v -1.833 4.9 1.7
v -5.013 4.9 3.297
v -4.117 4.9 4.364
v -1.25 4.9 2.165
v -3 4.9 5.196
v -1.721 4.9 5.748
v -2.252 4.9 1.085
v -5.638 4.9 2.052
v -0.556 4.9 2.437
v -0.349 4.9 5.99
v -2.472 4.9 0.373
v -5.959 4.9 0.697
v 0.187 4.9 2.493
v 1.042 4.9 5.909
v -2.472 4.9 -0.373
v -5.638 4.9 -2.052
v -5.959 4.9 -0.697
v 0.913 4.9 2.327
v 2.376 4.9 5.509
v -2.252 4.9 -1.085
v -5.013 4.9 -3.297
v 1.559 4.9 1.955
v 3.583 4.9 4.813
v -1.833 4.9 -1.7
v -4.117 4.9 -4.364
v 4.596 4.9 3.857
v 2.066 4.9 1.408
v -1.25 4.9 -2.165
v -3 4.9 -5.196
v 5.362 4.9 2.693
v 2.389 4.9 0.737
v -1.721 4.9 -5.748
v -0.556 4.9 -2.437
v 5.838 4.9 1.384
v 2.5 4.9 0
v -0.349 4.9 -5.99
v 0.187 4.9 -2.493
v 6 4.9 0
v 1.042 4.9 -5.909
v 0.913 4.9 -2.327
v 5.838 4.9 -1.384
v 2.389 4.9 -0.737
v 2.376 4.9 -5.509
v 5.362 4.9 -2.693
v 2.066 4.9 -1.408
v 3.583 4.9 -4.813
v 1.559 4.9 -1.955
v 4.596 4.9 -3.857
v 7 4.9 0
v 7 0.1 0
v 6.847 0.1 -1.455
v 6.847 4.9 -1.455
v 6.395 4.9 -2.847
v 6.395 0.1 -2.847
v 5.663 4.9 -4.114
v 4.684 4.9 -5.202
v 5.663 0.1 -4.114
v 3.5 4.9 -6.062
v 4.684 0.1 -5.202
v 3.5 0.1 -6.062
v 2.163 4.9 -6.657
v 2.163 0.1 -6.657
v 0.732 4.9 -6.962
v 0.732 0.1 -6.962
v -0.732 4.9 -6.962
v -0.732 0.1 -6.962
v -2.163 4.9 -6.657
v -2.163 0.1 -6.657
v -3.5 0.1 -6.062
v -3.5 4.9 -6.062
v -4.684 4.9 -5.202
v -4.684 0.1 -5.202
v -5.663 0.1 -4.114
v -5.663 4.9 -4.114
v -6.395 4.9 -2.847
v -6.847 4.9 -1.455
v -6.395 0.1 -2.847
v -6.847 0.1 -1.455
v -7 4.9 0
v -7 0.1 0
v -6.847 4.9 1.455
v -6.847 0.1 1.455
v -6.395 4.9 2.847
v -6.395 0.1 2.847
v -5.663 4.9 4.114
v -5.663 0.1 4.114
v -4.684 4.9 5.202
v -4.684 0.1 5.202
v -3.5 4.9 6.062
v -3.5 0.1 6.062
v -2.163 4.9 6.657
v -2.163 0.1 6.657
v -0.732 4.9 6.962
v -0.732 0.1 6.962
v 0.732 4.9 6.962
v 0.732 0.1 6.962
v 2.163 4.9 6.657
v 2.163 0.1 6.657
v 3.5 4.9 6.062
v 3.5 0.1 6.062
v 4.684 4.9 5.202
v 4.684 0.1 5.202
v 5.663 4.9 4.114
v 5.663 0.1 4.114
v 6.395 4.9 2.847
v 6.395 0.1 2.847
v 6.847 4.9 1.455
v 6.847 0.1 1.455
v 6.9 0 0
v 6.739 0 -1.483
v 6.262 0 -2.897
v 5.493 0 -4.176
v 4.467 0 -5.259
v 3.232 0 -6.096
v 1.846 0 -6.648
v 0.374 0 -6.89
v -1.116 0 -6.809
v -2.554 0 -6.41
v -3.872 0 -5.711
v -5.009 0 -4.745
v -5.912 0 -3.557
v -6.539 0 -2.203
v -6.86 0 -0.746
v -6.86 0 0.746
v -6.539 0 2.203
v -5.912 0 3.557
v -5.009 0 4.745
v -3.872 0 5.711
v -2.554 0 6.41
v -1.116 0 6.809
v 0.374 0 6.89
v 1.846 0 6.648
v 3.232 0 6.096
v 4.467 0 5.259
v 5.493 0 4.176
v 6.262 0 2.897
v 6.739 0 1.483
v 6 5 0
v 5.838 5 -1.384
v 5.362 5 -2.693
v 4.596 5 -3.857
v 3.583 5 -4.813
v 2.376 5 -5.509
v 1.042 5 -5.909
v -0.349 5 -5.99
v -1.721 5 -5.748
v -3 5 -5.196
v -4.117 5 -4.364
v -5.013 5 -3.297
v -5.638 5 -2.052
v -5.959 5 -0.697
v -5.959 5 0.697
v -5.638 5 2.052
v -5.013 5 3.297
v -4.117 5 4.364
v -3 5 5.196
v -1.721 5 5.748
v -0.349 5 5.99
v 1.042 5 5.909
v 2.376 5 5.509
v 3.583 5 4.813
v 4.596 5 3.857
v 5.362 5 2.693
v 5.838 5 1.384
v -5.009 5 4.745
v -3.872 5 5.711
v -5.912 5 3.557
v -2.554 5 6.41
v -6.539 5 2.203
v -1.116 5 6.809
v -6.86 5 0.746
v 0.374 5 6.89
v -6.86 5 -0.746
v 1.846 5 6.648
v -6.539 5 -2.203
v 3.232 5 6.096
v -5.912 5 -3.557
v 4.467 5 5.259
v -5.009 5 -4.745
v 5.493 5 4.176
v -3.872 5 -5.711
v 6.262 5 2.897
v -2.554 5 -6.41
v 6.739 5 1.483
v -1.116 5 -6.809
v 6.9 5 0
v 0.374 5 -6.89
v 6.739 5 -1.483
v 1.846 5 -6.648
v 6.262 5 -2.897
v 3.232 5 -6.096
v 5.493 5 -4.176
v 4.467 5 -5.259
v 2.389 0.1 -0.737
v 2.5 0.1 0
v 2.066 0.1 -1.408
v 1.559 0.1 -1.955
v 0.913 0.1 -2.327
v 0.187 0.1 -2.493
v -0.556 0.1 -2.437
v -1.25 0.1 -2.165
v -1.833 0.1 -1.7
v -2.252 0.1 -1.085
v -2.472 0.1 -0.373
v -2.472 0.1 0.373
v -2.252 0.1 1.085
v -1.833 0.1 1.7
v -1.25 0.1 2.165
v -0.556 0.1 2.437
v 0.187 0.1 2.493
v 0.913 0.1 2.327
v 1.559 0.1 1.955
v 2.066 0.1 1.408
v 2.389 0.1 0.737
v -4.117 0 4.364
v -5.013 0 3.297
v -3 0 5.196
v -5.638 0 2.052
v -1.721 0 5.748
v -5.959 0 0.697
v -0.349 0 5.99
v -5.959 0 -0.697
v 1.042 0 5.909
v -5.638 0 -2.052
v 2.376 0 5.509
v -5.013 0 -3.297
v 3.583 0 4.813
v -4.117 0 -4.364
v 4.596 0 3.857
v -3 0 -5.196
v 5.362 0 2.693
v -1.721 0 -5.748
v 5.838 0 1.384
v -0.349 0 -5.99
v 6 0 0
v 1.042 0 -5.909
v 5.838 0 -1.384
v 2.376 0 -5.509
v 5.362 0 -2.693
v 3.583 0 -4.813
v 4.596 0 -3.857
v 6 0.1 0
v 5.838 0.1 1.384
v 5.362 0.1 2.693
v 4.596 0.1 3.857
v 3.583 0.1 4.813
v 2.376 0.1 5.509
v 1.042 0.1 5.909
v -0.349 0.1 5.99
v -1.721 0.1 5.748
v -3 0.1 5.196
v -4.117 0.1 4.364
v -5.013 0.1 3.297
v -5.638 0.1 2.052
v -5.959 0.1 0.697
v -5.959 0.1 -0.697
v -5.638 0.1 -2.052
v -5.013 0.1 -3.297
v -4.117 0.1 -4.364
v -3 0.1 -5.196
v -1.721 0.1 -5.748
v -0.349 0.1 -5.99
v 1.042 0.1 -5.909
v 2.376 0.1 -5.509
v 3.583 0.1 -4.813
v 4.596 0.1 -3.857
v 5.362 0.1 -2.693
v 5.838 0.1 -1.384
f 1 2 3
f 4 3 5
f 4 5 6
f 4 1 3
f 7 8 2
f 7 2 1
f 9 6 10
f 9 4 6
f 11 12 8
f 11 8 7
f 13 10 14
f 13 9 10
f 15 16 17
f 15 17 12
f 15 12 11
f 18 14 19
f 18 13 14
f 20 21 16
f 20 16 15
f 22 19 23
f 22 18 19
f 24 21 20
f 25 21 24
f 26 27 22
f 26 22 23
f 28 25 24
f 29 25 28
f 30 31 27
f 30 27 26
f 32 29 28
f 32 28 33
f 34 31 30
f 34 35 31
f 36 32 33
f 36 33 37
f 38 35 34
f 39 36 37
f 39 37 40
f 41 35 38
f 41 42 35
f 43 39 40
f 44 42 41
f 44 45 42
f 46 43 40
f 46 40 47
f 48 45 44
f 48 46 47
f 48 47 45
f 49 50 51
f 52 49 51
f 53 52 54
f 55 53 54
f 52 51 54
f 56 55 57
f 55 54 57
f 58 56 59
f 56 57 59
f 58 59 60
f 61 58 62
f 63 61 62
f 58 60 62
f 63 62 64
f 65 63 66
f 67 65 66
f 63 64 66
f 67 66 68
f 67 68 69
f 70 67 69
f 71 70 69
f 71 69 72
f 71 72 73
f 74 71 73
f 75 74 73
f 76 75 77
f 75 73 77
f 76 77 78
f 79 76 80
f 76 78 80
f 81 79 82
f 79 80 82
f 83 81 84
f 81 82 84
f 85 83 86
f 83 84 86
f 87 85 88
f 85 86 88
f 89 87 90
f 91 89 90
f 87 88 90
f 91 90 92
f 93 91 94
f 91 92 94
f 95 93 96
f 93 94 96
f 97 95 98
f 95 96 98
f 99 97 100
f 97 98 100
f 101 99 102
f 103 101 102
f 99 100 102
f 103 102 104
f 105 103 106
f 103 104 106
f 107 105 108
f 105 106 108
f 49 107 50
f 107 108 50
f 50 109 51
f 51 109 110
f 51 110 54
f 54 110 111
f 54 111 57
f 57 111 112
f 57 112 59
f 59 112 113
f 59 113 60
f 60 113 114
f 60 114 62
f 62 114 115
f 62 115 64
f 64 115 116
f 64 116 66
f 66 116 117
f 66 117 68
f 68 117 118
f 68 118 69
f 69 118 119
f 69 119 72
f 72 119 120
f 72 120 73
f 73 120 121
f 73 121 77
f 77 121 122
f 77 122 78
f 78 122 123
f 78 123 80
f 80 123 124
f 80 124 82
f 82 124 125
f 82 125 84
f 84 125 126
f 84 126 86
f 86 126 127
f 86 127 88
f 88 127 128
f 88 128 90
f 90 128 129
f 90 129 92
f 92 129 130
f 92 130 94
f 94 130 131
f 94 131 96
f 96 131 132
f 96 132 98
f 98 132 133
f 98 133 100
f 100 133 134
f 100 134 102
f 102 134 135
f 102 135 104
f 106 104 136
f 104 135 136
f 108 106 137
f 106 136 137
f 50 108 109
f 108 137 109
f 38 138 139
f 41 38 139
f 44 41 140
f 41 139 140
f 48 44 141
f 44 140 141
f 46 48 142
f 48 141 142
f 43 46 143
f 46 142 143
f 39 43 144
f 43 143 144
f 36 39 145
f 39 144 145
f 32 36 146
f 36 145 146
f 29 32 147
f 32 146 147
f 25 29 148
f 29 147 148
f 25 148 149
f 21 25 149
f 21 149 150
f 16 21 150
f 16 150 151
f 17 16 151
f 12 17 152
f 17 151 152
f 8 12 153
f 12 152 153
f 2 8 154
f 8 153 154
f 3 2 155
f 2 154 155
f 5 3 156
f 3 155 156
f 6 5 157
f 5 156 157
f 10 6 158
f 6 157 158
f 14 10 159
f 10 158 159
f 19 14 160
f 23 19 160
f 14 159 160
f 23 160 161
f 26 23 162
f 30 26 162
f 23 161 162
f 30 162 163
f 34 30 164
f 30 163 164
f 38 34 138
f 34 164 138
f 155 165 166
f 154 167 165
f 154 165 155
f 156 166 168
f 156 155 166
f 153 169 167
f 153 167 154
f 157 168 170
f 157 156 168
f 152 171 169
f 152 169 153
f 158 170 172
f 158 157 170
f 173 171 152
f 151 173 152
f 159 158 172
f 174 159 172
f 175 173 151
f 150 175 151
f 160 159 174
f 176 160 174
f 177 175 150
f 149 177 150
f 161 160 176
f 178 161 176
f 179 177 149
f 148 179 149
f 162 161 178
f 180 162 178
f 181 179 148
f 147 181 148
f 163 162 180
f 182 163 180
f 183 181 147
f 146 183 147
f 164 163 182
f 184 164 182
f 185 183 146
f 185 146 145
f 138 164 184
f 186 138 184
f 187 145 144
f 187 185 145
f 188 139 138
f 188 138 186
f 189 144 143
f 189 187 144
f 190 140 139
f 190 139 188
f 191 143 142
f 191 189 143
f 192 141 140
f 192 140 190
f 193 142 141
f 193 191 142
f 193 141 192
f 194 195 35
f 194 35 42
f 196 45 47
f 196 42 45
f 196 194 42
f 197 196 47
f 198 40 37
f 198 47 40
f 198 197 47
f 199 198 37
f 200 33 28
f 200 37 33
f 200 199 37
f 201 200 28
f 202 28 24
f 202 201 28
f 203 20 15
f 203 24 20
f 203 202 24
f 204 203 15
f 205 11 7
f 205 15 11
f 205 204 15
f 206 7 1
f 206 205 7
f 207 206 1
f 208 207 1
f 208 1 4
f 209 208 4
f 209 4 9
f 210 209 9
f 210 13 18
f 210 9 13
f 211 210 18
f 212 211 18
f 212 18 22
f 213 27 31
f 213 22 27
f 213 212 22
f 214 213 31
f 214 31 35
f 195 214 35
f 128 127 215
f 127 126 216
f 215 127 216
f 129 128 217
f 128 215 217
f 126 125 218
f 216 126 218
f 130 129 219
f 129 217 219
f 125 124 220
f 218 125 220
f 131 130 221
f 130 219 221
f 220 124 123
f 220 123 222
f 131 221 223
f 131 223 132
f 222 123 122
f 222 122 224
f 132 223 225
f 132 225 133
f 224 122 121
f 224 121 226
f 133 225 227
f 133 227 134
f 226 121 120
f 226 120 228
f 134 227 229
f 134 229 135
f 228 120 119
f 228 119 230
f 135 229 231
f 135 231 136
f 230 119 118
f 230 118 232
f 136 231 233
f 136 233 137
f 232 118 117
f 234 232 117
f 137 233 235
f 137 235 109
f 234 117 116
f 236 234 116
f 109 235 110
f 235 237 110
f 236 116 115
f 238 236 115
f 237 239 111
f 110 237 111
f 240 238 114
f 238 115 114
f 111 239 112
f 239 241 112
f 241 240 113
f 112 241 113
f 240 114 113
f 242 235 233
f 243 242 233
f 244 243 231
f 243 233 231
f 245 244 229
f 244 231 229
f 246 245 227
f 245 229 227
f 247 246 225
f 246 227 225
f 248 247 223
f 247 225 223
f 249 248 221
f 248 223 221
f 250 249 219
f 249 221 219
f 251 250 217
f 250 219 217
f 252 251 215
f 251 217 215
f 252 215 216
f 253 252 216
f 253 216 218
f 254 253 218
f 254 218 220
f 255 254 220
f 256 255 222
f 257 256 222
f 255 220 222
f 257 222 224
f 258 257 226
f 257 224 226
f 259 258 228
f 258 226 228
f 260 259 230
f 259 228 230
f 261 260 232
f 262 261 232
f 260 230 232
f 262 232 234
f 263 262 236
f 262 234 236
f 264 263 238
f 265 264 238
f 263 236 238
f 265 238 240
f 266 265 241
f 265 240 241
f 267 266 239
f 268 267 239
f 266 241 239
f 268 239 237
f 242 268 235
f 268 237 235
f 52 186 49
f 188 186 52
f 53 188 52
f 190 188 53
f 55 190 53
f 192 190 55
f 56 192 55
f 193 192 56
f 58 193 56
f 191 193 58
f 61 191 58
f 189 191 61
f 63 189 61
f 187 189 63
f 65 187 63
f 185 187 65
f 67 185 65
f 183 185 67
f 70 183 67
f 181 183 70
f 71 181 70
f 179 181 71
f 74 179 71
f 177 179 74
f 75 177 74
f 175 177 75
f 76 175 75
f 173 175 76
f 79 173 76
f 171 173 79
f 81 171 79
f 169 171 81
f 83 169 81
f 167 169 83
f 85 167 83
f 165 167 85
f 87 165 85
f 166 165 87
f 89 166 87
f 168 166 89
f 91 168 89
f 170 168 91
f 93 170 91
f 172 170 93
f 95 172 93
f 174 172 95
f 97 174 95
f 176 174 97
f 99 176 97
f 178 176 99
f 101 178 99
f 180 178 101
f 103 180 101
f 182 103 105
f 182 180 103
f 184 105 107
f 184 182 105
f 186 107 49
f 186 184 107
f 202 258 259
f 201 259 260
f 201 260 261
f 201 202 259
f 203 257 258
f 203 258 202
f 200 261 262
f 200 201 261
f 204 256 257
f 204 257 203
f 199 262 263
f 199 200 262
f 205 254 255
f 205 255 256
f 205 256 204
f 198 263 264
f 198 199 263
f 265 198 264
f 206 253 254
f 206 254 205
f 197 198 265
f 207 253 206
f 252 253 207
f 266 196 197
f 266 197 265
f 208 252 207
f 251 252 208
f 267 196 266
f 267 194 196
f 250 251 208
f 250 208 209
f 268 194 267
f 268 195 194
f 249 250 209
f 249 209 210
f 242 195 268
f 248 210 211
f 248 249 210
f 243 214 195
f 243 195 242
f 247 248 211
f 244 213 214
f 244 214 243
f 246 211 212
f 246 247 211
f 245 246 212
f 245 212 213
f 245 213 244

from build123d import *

# Parameters (mm, degrees)
SKETCH1_R           = 7
SKETCH1_R_2         = 2.5
BOSS_EXTRUDE1_DEPTH = 5
SKETCH2_R           = 6
CUT_EXTRUDE1_DEPTH  = 0.1
SKETCH3_R           = 6
CUT_EXTRUDE2_DEPTH  = 0.1
CHAMFER1_SIZE       = 0.1


with BuildPart() as part:
    # Sketch1 → Boss-Extrude1 (new body)
    with BuildSketch(Plane(origin=(0, 0, 0), x_dir=(1, 0, 0), z_dir=(0, 1, 0))):
        Circle(SKETCH1_R)
        Circle(SKETCH1_R_2, mode=Mode.SUBTRACT)
    extrude(amount=BOSS_EXTRUDE1_DEPTH)

    # Sketch2 → Cut-Extrude1 (cut)
    with BuildSketch(Plane(origin=(0, 5, 0), x_dir=(1, 0, 0), z_dir=(0, 1, 0))):
        Circle(SKETCH2_R)
    extrude(amount=-CUT_EXTRUDE1_DEPTH, mode=Mode.SUBTRACT)

    # Sketch3 → Cut-Extrude2 (cut)
    with BuildSketch(Plane.XZ):
        Circle(SKETCH3_R)
    extrude(amount=-CUT_EXTRUDE2_DEPTH, mode=Mode.SUBTRACT)

    # Chamfer1
    chamfer1_edges = [part.edges().sort_by_distance(p)[0] for p in [
        (-7, 0, 0),
        (-7, 5, 0),
    ]]
    chamfer(chamfer1_edges, length=CHAMFER1_SIZE)


solid = part.part
